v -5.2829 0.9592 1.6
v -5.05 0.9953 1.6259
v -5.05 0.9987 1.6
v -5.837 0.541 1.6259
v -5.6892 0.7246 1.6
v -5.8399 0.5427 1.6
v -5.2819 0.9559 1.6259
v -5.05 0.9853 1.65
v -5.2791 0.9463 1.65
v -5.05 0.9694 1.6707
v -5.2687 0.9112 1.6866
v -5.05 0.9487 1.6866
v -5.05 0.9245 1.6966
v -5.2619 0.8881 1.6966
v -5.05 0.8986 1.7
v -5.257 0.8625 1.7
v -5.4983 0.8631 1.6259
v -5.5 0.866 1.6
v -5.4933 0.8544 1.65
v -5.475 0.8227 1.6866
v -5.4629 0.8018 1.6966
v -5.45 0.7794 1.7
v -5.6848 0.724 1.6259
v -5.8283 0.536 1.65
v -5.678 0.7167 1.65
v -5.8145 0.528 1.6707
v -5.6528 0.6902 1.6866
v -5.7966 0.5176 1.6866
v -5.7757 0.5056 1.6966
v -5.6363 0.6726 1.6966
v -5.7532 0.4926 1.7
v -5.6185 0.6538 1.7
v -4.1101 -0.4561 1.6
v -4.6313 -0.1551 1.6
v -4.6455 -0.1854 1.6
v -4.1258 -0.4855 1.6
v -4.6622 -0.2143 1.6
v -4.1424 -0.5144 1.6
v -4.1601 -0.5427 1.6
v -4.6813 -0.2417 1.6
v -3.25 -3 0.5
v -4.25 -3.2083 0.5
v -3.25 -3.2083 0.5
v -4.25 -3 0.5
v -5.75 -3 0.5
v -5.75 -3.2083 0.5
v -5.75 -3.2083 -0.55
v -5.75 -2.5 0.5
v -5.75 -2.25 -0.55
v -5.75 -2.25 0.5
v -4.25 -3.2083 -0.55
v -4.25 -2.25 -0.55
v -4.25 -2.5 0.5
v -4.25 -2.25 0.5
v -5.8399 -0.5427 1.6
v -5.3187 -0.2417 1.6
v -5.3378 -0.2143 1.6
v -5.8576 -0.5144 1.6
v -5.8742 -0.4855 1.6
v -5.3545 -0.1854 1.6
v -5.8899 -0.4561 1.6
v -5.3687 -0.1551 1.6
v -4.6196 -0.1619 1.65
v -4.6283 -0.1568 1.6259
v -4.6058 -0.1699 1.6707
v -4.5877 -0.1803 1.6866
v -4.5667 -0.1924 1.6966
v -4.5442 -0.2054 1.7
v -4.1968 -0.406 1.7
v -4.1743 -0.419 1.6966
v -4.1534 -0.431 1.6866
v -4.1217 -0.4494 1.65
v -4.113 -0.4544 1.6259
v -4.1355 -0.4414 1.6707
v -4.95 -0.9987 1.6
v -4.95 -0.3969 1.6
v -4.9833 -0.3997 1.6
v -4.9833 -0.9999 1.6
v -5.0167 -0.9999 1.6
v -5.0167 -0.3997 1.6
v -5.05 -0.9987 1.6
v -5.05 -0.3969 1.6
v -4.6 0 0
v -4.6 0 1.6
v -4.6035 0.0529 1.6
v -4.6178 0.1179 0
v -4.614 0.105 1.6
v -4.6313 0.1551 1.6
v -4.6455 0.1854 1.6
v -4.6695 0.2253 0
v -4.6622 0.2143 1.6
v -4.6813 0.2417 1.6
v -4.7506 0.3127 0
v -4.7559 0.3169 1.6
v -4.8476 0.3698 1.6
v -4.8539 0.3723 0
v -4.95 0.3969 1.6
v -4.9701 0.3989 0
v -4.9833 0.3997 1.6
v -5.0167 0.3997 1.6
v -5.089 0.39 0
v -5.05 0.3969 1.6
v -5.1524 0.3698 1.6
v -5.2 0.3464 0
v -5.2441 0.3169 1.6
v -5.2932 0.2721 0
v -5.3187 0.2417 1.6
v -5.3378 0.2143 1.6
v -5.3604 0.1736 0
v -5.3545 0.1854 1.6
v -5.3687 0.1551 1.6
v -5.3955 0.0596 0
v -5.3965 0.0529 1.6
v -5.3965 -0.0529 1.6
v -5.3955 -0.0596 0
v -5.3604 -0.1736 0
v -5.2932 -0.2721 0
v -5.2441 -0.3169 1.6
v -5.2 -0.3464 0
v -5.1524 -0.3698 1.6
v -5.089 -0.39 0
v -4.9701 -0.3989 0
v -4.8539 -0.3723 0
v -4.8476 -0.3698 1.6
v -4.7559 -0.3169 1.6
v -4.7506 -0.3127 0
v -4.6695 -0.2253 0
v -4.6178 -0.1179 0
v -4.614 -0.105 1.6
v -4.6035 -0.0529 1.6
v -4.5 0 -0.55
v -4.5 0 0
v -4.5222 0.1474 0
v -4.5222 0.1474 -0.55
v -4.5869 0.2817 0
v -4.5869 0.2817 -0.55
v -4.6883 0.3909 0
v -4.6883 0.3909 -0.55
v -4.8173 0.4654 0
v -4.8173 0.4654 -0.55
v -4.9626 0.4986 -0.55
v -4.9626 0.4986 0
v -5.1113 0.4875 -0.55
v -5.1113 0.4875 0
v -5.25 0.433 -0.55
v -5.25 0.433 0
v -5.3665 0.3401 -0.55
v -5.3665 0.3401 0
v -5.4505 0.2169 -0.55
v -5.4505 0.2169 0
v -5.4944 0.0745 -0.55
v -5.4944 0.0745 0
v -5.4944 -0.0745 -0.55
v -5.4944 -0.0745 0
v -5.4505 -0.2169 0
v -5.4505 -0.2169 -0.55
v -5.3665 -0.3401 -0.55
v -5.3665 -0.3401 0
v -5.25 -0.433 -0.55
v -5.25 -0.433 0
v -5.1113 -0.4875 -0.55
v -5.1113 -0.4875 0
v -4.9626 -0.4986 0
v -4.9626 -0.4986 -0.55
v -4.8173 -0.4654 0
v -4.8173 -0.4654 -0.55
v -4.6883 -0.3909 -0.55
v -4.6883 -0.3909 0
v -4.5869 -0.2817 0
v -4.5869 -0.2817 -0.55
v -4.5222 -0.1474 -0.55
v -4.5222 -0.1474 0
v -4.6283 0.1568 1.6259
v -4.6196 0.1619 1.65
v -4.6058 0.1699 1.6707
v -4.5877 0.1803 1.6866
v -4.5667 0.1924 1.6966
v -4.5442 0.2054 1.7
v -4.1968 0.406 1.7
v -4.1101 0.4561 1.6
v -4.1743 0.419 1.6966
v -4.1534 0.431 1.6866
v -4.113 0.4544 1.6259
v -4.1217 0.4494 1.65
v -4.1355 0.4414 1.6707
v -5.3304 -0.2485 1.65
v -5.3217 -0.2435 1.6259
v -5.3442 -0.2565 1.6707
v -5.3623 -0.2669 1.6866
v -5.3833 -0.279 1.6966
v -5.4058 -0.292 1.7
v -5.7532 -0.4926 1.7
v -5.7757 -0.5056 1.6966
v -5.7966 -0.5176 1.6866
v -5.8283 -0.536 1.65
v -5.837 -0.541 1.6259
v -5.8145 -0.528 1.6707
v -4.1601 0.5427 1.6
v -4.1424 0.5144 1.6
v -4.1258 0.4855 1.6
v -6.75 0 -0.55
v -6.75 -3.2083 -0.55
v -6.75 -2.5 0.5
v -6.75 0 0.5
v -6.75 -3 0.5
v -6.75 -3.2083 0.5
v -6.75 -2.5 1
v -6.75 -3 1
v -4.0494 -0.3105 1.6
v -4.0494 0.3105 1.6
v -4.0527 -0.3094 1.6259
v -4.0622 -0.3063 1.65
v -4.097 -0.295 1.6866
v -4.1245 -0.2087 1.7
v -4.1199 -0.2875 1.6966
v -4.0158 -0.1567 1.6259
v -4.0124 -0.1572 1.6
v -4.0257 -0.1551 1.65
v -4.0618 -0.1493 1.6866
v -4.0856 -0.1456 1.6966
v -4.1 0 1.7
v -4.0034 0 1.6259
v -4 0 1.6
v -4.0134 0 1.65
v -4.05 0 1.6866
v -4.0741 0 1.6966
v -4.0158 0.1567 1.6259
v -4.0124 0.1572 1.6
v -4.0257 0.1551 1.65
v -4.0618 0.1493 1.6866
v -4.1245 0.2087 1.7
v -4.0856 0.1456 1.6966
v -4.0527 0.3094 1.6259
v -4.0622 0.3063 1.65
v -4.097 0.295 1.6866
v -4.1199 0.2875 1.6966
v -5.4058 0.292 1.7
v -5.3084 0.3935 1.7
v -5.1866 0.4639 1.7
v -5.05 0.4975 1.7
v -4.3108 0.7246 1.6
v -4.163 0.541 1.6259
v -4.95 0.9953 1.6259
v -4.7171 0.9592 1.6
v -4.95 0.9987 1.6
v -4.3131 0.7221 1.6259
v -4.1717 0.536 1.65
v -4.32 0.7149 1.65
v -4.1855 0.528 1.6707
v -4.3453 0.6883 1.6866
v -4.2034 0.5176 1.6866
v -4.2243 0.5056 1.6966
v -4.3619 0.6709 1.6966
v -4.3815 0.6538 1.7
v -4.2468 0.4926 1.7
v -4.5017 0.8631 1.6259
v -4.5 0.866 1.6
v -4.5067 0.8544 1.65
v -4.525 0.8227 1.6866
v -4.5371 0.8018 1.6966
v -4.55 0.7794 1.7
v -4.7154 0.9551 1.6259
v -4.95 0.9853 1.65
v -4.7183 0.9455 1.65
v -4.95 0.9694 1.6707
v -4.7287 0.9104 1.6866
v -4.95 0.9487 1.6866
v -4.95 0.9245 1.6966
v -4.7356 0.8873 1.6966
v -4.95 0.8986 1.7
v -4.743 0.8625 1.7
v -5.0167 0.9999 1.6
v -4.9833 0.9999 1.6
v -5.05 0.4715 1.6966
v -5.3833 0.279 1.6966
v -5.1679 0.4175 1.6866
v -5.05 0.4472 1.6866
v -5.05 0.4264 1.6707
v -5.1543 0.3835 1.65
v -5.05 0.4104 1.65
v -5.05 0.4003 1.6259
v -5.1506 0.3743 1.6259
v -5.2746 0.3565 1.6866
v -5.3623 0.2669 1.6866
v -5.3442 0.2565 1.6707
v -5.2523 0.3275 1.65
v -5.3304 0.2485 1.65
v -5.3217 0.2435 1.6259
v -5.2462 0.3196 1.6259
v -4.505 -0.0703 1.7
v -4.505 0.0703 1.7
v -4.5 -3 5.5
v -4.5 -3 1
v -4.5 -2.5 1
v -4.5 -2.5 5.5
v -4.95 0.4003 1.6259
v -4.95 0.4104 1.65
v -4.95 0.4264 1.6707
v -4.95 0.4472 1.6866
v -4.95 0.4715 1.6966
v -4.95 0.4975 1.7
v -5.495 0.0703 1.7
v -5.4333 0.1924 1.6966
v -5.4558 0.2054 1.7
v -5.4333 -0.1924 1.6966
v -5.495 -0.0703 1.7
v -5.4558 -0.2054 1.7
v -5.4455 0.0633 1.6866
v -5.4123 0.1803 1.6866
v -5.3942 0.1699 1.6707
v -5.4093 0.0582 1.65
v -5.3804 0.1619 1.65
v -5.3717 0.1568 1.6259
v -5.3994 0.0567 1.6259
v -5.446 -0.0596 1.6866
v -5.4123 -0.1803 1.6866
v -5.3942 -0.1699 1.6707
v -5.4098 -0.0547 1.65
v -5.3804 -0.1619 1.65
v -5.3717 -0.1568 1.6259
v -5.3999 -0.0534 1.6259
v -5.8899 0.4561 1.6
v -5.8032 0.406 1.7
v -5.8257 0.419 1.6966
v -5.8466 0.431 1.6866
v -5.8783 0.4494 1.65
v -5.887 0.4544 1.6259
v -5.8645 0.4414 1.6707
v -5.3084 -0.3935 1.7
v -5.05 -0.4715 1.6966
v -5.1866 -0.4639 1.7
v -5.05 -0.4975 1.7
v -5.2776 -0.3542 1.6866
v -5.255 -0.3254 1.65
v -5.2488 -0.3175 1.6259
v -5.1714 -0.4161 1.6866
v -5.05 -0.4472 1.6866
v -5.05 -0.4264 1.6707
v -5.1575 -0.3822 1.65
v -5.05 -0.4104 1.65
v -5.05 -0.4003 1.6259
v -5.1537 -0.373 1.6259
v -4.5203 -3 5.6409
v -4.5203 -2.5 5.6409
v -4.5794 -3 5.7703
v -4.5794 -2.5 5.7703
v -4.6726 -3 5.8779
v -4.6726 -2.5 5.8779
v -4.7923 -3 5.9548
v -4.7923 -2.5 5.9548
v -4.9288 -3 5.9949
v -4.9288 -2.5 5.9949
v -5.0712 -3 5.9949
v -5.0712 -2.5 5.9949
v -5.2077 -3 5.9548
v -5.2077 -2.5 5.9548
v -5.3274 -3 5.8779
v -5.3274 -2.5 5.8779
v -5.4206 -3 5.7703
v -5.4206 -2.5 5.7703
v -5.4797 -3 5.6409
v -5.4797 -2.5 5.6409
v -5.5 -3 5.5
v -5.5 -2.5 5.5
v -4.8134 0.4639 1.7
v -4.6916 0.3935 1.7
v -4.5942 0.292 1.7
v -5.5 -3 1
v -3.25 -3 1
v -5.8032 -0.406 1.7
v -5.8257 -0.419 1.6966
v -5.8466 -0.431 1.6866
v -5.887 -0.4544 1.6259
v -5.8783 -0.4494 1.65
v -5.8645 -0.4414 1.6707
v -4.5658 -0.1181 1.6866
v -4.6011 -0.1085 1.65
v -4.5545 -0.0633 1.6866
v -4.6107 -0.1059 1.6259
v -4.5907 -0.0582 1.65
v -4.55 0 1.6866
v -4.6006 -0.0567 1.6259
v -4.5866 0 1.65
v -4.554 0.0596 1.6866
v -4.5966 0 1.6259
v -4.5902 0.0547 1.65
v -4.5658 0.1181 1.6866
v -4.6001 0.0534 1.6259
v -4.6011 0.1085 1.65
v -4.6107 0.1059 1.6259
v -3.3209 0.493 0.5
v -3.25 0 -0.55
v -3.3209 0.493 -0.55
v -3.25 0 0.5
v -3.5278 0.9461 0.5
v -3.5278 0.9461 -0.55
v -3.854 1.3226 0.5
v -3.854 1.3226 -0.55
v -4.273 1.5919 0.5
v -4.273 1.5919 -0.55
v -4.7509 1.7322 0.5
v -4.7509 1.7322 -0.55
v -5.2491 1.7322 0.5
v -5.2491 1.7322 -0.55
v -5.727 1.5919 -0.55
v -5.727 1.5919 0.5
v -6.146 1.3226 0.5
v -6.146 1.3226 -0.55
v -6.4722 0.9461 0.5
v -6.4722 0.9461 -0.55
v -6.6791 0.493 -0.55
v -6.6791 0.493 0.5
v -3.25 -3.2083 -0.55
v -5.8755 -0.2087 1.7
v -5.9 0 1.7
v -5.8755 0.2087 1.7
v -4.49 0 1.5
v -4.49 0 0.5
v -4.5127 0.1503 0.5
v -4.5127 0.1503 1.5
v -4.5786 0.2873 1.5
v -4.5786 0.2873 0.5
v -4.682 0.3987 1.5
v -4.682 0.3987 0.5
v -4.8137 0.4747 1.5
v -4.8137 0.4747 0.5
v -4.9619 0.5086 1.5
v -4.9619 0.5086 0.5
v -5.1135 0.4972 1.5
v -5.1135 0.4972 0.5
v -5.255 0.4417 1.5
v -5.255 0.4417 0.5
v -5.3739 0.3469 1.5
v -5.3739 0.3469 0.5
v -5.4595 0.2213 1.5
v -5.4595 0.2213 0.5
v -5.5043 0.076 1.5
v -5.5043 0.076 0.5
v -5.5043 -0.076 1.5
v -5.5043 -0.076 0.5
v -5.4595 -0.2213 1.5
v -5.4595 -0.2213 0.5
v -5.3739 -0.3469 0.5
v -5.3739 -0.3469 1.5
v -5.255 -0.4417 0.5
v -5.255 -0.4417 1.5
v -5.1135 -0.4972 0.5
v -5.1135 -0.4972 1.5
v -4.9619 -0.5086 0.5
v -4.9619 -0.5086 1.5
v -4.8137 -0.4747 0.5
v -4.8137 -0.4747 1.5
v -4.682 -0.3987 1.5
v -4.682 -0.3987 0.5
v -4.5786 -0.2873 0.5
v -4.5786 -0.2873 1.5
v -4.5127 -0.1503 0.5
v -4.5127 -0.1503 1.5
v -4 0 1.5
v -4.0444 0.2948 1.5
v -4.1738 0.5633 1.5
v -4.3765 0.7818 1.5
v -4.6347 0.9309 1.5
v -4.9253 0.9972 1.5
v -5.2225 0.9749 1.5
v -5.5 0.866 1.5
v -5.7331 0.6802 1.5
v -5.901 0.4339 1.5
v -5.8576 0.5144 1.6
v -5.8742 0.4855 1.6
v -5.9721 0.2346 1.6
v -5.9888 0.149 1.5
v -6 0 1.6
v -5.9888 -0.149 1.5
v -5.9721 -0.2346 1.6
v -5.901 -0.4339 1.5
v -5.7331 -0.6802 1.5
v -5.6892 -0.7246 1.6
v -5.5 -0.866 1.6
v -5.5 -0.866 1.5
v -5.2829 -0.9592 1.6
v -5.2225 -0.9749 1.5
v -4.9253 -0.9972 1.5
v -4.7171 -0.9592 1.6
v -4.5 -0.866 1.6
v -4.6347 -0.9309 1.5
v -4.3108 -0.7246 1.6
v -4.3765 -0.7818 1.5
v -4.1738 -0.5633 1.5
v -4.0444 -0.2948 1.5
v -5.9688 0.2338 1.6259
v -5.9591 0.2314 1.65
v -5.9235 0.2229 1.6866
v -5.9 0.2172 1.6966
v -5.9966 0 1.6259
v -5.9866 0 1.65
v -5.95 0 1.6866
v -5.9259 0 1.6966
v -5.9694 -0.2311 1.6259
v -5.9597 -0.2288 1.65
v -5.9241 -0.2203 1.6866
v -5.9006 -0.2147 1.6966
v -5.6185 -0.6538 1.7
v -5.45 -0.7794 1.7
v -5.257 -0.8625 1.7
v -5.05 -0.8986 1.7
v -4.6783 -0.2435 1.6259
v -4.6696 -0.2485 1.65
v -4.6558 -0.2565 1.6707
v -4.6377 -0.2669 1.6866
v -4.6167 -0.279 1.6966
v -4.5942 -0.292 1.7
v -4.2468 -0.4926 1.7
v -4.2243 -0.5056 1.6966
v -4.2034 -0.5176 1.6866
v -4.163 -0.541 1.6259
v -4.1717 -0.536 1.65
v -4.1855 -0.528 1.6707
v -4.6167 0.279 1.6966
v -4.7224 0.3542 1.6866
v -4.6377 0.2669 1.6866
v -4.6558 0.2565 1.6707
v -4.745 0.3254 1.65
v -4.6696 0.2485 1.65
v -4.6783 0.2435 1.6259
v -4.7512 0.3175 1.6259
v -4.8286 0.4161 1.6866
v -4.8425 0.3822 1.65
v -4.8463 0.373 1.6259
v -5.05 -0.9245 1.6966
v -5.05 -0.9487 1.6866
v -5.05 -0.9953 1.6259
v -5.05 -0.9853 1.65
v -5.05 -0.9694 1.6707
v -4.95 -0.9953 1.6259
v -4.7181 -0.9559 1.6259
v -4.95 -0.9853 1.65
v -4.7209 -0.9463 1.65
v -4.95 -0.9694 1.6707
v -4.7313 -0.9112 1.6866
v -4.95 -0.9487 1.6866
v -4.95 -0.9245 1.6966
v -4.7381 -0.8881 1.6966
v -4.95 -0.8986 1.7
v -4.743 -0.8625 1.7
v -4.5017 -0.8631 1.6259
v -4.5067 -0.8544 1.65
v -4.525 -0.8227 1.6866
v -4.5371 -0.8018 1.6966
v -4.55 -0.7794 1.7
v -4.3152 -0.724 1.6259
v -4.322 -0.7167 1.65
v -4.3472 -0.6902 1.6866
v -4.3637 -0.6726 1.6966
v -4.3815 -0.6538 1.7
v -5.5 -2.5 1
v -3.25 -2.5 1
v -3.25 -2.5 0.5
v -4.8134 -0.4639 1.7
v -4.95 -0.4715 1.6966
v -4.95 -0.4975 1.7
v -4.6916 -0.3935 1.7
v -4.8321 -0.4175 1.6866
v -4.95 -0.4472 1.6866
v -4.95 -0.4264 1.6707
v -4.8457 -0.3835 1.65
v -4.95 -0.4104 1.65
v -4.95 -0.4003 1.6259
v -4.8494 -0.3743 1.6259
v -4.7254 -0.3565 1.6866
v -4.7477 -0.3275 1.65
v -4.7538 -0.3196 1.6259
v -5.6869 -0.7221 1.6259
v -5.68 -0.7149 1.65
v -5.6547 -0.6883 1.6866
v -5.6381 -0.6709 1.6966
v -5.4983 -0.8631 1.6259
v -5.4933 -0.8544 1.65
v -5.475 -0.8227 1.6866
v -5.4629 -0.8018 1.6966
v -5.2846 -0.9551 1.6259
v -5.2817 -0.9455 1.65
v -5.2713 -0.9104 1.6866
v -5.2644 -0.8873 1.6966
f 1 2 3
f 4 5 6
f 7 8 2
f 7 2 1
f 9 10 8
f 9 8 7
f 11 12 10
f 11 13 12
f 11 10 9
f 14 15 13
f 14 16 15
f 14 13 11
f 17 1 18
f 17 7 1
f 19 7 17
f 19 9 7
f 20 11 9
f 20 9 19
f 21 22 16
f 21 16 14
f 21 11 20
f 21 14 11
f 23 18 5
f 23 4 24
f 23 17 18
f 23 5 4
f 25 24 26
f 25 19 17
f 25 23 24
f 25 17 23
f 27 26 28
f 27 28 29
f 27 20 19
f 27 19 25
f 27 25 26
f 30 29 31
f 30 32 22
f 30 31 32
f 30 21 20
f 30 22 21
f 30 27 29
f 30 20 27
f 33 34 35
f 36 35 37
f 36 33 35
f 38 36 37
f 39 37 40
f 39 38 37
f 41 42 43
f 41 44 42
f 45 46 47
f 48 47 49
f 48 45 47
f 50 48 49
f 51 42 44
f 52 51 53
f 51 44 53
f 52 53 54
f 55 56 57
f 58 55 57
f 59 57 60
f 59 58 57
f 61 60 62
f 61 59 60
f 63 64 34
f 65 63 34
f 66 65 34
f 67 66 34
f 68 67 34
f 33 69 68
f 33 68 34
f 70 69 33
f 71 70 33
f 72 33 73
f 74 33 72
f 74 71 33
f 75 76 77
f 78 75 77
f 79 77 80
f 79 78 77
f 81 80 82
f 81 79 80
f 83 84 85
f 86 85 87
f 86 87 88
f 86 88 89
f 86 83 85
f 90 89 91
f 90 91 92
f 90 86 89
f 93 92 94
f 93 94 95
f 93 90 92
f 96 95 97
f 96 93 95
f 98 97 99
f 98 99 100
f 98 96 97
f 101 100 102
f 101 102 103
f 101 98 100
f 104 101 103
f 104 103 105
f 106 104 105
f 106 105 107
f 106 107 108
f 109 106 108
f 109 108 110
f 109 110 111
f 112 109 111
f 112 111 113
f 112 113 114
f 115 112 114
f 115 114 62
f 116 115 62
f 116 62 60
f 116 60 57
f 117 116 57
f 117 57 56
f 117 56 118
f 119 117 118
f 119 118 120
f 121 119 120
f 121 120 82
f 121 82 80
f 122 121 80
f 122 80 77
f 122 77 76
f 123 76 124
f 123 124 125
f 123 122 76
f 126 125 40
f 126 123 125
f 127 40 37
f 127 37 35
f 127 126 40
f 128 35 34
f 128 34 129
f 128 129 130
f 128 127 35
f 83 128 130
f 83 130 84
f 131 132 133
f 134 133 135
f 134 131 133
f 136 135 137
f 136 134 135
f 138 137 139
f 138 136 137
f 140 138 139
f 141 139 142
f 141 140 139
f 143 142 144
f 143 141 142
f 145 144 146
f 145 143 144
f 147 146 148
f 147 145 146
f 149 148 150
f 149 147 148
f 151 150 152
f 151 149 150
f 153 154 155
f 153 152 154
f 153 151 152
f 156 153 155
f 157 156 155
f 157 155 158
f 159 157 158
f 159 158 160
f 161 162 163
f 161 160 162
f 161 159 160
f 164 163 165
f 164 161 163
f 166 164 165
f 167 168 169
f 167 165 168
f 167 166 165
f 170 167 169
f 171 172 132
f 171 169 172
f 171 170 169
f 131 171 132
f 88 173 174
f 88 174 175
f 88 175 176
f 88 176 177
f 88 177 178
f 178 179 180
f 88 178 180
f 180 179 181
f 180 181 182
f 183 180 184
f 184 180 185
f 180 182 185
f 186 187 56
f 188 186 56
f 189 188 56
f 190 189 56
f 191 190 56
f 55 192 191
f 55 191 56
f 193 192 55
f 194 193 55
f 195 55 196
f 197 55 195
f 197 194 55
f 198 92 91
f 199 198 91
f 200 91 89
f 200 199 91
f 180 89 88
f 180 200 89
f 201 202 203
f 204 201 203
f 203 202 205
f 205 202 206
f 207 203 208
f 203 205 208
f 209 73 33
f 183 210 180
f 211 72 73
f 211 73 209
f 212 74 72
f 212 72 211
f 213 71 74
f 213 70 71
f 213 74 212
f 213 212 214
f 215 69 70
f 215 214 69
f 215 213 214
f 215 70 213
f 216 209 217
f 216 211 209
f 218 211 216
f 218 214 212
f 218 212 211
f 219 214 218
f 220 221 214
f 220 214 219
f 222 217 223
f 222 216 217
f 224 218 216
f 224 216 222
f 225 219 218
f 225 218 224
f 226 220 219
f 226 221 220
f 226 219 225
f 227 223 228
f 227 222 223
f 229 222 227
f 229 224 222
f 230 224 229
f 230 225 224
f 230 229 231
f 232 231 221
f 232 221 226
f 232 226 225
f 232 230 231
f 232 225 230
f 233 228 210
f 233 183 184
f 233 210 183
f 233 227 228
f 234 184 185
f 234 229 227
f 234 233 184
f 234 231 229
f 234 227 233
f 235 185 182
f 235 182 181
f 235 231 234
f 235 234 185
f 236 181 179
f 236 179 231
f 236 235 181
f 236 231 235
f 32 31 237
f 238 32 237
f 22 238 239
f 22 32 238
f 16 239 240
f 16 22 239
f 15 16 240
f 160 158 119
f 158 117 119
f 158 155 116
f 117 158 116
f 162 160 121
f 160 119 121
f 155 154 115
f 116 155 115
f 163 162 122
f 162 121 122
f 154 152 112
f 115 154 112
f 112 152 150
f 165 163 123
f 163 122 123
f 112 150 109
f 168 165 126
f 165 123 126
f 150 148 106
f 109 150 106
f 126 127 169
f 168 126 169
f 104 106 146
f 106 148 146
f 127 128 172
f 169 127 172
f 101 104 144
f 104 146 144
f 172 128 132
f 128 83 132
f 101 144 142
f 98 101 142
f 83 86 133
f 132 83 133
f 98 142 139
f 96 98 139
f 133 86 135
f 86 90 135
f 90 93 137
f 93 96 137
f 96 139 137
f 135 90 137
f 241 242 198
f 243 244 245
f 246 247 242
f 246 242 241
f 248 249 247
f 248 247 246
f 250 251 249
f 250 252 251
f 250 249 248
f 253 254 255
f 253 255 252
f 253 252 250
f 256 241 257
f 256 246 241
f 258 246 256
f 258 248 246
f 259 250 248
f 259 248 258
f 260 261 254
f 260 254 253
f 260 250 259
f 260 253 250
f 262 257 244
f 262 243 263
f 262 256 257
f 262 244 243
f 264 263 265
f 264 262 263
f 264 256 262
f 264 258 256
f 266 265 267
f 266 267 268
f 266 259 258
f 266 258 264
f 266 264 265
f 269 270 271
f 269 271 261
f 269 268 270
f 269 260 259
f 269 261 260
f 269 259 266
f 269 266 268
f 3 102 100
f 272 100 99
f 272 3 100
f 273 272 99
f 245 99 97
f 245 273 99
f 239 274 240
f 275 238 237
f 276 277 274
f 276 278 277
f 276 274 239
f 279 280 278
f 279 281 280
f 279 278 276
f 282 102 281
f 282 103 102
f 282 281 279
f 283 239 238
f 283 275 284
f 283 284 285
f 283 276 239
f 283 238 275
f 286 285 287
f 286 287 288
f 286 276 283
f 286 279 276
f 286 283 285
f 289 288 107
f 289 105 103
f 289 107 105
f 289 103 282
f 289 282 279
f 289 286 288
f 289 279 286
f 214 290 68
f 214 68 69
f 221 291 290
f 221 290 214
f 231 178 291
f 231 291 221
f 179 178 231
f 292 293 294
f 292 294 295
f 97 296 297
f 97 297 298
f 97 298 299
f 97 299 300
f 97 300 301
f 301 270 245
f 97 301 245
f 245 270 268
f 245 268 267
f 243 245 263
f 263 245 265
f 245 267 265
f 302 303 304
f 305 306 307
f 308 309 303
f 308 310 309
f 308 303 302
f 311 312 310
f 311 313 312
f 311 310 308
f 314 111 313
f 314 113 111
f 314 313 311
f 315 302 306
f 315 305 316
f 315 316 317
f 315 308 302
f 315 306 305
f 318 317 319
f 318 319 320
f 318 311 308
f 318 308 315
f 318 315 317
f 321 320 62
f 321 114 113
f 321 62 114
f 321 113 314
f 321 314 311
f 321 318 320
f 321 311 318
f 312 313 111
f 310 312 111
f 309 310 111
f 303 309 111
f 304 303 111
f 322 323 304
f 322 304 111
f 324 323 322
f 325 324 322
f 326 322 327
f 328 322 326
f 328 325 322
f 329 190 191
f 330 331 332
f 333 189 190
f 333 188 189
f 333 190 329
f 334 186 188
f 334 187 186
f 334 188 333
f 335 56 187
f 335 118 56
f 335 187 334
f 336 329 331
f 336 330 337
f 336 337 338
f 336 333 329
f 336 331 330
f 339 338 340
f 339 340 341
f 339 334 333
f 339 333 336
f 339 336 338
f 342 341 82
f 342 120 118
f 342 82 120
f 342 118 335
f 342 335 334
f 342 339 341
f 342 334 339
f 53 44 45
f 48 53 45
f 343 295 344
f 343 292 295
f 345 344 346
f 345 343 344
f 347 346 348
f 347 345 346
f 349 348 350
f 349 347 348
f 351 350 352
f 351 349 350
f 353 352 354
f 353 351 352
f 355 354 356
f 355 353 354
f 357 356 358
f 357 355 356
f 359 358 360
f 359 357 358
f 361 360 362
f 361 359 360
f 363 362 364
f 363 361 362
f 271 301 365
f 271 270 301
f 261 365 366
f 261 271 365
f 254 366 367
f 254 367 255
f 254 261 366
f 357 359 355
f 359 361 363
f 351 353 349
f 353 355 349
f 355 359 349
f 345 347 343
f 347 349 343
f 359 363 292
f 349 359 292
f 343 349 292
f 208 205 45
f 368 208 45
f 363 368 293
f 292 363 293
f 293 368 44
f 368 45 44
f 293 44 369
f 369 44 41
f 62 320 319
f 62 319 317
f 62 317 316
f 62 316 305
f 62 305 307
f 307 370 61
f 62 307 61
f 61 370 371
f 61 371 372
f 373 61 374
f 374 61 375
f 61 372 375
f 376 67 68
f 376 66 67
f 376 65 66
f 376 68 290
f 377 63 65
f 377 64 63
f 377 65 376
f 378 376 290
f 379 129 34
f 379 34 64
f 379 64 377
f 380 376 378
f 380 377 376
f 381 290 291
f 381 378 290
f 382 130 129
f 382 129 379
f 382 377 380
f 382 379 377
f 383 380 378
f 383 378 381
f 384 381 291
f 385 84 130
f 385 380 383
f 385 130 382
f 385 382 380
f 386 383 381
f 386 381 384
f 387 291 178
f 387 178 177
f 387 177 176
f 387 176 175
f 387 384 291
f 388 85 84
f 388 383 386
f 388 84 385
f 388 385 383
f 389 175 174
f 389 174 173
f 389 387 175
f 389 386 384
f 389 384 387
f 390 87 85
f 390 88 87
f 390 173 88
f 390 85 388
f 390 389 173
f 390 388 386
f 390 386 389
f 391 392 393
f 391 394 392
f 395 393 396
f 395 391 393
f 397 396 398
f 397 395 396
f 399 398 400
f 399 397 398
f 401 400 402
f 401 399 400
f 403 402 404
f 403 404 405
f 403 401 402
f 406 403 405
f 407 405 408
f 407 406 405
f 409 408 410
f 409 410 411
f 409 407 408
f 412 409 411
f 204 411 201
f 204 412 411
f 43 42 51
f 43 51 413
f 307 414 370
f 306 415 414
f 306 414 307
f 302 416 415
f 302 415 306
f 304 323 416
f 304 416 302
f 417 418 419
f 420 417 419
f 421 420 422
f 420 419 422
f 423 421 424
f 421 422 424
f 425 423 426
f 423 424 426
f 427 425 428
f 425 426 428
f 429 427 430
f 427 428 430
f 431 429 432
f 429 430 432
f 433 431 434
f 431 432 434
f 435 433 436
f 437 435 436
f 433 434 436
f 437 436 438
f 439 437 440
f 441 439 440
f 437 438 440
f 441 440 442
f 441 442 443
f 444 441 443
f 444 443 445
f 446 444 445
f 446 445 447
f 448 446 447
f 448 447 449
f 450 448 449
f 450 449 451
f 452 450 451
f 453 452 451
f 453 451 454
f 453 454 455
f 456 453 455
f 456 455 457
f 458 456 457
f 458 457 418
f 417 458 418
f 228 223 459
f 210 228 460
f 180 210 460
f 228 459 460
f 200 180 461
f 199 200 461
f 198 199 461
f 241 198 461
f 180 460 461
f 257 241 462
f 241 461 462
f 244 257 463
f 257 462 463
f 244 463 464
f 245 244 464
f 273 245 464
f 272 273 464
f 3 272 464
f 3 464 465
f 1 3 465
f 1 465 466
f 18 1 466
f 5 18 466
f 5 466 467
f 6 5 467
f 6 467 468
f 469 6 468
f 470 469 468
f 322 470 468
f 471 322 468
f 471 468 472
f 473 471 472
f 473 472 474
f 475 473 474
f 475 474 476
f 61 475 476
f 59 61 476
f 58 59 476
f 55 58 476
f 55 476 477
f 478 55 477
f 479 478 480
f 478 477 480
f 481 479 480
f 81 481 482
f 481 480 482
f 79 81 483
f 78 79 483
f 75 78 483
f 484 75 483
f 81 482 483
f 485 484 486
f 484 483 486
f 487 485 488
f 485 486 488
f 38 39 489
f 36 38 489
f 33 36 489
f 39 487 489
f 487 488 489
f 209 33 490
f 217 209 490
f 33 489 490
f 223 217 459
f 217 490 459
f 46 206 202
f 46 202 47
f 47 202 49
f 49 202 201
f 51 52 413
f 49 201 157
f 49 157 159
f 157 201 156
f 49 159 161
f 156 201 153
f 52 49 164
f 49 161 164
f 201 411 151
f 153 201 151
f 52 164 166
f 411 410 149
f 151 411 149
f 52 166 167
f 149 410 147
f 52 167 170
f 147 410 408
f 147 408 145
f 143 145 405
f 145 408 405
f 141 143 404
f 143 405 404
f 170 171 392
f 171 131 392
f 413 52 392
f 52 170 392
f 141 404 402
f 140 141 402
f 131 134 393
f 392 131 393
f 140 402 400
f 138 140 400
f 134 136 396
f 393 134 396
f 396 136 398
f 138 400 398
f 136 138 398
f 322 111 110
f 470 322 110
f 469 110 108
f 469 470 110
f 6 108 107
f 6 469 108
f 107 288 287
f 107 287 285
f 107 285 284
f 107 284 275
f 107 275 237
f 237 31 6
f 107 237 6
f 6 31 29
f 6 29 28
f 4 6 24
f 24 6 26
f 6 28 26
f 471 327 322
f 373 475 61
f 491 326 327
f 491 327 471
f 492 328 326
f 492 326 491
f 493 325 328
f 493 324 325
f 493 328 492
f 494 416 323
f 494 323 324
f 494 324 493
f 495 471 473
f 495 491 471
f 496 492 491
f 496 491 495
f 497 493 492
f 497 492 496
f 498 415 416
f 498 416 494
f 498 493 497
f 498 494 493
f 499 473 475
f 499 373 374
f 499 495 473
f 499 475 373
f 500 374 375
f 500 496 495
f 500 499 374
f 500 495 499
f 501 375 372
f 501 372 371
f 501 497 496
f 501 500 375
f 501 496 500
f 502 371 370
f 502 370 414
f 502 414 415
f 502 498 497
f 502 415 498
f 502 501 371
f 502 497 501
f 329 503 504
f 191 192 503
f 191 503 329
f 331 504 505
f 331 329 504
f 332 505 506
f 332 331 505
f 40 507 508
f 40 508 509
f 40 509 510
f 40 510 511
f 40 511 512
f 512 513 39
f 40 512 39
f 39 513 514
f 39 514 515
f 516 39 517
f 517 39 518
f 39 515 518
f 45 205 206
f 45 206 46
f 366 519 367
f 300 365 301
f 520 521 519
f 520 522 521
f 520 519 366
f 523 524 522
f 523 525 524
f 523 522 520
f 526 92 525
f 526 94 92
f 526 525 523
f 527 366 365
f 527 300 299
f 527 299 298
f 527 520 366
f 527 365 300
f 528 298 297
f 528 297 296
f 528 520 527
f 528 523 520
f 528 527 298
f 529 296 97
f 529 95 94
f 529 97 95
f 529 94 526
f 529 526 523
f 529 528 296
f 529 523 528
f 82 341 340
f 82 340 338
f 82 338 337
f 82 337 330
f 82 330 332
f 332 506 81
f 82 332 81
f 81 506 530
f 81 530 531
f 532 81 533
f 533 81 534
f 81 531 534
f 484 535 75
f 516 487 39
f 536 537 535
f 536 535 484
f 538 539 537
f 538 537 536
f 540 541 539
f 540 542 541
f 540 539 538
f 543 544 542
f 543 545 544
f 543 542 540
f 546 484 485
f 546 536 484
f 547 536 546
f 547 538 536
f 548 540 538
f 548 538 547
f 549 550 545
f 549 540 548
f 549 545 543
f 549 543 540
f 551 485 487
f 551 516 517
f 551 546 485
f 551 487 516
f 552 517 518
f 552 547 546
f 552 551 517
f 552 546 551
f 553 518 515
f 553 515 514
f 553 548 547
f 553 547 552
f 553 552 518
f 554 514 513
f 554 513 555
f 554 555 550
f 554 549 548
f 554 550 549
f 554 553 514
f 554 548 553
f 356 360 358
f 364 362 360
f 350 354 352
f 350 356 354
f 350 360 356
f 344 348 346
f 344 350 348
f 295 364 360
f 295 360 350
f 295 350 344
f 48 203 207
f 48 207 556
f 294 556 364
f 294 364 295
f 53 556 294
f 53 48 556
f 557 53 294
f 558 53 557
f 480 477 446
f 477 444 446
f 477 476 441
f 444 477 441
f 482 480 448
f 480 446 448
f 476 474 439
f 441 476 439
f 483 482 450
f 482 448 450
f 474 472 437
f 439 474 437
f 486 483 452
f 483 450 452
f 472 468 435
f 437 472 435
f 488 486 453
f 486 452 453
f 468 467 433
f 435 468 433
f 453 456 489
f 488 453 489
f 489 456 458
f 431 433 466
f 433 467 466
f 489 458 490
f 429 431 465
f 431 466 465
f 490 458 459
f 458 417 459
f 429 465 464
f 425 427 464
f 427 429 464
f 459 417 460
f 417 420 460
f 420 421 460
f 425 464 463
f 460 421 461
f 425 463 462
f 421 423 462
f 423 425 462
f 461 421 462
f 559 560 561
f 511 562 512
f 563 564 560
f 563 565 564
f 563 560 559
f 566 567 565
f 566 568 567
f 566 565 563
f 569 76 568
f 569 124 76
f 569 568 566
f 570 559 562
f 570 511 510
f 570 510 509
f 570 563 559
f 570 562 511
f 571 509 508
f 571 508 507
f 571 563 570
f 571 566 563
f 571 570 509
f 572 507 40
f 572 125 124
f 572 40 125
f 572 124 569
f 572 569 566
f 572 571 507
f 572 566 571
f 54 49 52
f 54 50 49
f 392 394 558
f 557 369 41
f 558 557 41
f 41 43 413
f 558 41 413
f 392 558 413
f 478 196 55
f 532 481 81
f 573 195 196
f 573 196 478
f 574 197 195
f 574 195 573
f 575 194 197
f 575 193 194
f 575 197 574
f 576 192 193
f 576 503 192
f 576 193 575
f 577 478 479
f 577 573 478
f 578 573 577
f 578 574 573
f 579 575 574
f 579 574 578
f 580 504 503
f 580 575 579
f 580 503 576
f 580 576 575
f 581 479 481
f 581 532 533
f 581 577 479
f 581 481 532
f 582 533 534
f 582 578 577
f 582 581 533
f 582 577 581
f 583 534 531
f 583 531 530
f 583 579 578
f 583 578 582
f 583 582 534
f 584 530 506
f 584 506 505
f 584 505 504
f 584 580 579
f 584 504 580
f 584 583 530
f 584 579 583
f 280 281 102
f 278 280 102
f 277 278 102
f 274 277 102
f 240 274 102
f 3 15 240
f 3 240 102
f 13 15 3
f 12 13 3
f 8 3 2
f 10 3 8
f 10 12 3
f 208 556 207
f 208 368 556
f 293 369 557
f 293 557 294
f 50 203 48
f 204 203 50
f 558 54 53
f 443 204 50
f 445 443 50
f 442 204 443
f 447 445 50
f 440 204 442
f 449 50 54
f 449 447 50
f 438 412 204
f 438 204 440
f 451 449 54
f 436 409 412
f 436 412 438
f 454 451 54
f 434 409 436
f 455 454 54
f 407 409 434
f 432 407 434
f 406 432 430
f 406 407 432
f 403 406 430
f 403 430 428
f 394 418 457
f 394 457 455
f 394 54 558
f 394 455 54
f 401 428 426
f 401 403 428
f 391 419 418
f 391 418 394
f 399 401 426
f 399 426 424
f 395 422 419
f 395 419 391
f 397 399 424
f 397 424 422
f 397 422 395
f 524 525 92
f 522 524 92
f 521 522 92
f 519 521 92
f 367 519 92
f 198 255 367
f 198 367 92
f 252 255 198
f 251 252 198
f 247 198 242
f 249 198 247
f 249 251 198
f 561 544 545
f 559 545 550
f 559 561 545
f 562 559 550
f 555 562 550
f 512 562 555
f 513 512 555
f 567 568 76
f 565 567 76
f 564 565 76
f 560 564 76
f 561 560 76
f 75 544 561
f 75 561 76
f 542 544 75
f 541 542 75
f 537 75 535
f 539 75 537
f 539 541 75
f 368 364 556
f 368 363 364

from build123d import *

# Parameters (mm, degrees)
SKETCH_R           = 0.5
SKETCH_W           = 1.5
SKETCH_H           = 1
PAD_DEPTH          = 0.5
PAD_DEPTH_BACK     = 0.55
SKETCH001_W        = 4.919434
SKETCH001_H        = 5.037946
POCKET_DEPTH       = 1.05
POCKET_DEPTH_BACK  = 1.55
SKETCH006_W        = 1.496239
SKETCH006_H        = 0.320585
POCKET003_DEPTH    = 5
SKETCH002_R        = 0.51
SKETCH002_R_2      = 0.4
PAD001_DEPTH       = 1.5
SKETCH003_R        = 1
PAD002_DEPTH       = 0.2
SKETCH004_R        = 0.4
POCKET001_DEPTH    = 1
FILLET_R           = 0.1
SKETCH005_W        = 0.1
SKETCH005_H        = 1.784702
POCKET002_DEPTH    = 0.1
POLARPATTERN_COUNT = 6
PAD003_DEPTH       = 0.25


with BuildPart() as part:
    # Sketch → Pad (new body, two sides)
    with BuildSketch(Plane.XY) as pad_sk:
        with BuildLine():
            ThreePointArc((1.75, 0), (0, 1.75), (-1.75, 0))
            Line((-1.75, 0), (-1.75, -4.25))
            Line((-1.75, -4.25), (-1.75, -8))
            Line((-1.75, -8), (1.75, -8))
            Line((1.75, -8), (1.75, -4.25))
            Line((1.75, -4.25), (1.75, 0))
        make_face()
        Circle(SKETCH_R, mode=Mode.SUBTRACT)
        with Locations((0, -2.75)):
            Rectangle(SKETCH_W, SKETCH_H, mode=Mode.SUBTRACT)
    extrude(amount=PAD_DEPTH)
    extrude(pad_sk.sketch, amount=-PAD_DEPTH_BACK)

    # Sketch001 → Pocket (cut, two sides)
    with BuildSketch(Plane.XY) as pocket_sk:
        with Locations((-0.357018, -5.727314)):
            Rectangle(SKETCH001_W, SKETCH001_H)
    extrude(amount=-POCKET_DEPTH, mode=Mode.SUBTRACT)
    extrude(pocket_sk.sketch, amount=POCKET_DEPTH_BACK, mode=Mode.SUBTRACT)

    # Sketch006 → Pocket003 (cut)
    with BuildSketch(Plane.XY):
        with Locations((-0.005068, -3.405655)):
            Rectangle(SKETCH006_W, SKETCH006_H)
    extrude(amount=-POCKET003_DEPTH, mode=Mode.SUBTRACT)

    # Sketch002 → Pad001 (join)
    with BuildSketch(Plane.XY):
        Circle(SKETCH002_R)
        Circle(SKETCH002_R_2, mode=Mode.SUBTRACT)
    extrude(amount=PAD001_DEPTH)

    # Sketch003 → Pad002 (join)
    with BuildSketch(Plane.XY.offset(1.5)):
        Circle(SKETCH003_R)
    extrude(amount=PAD002_DEPTH)

    # Sketch004 → Pocket001 (cut)
    with BuildSketch(Plane.XY.offset(1.7)):
        Circle(SKETCH004_R)
    extrude(amount=-POCKET001_DEPTH, mode=Mode.SUBTRACT)

    # Fillet
    fillet_edges = [part.edges().sort_by_distance(p)[0] for p in [
        (-0.4, 0, 1.7),
        (-1, 0, 1.7),
    ]]
    fillet(fillet_edges, radius=FILLET_R)

    # Sketch005 → Pocket002 (cut)
    with BuildSketch(Plane.XY.offset(1.7)):
        with Locations((0, 0.892351)):
            Rectangle(SKETCH005_W, SKETCH005_H)
    pocket002 = extrude(amount=-POCKET002_DEPTH, mode=Mode.SUBTRACT)

    # PolarPattern: Pocket002 ×6 about axis
    polarpattern_axis = Axis((0, 0, 1.7), (0, 0, 1))
    for i in range(1, POLARPATTERN_COUNT):
        add(pocket002.rotate(polarpattern_axis, i * 360 / POLARPATTERN_COUNT), mode=Mode.SUBTRACT)

    # Sketch007 → Pad003 (join, symmetric)
    with BuildSketch(Plane(origin=(0, -2.75, -0.05), x_dir=(-1, 0, 0), z_dir=(0, -1, 0))):
        with BuildLine():
            Line((-1.75, -0.55), (1.75, -0.55))
            Line((1.75, -0.55), (1.75, -1.05))
            Line((0.5, -1.05), (1.75, -1.05))
            Line((0.5, -5.55), (0.5, -1.05))
            ThreePointArc((-0.5, -5.55), (0, -6.05), (0.5, -5.55))
            Line((-0.5, -1.05), (-0.5, -5.55))
            Line((-1.75, -1.05), (-0.5, -1.05))
            Line((-1.75, -1.05), (-1.75, -0.55))
        make_face()
    extrude(amount=PAD003_DEPTH, both=True)


with BuildPart() as part_1:
    # Body001 placement: moved
    add(part.part.moved(Location((-5, 0, 0))))


solid = part_1.part
